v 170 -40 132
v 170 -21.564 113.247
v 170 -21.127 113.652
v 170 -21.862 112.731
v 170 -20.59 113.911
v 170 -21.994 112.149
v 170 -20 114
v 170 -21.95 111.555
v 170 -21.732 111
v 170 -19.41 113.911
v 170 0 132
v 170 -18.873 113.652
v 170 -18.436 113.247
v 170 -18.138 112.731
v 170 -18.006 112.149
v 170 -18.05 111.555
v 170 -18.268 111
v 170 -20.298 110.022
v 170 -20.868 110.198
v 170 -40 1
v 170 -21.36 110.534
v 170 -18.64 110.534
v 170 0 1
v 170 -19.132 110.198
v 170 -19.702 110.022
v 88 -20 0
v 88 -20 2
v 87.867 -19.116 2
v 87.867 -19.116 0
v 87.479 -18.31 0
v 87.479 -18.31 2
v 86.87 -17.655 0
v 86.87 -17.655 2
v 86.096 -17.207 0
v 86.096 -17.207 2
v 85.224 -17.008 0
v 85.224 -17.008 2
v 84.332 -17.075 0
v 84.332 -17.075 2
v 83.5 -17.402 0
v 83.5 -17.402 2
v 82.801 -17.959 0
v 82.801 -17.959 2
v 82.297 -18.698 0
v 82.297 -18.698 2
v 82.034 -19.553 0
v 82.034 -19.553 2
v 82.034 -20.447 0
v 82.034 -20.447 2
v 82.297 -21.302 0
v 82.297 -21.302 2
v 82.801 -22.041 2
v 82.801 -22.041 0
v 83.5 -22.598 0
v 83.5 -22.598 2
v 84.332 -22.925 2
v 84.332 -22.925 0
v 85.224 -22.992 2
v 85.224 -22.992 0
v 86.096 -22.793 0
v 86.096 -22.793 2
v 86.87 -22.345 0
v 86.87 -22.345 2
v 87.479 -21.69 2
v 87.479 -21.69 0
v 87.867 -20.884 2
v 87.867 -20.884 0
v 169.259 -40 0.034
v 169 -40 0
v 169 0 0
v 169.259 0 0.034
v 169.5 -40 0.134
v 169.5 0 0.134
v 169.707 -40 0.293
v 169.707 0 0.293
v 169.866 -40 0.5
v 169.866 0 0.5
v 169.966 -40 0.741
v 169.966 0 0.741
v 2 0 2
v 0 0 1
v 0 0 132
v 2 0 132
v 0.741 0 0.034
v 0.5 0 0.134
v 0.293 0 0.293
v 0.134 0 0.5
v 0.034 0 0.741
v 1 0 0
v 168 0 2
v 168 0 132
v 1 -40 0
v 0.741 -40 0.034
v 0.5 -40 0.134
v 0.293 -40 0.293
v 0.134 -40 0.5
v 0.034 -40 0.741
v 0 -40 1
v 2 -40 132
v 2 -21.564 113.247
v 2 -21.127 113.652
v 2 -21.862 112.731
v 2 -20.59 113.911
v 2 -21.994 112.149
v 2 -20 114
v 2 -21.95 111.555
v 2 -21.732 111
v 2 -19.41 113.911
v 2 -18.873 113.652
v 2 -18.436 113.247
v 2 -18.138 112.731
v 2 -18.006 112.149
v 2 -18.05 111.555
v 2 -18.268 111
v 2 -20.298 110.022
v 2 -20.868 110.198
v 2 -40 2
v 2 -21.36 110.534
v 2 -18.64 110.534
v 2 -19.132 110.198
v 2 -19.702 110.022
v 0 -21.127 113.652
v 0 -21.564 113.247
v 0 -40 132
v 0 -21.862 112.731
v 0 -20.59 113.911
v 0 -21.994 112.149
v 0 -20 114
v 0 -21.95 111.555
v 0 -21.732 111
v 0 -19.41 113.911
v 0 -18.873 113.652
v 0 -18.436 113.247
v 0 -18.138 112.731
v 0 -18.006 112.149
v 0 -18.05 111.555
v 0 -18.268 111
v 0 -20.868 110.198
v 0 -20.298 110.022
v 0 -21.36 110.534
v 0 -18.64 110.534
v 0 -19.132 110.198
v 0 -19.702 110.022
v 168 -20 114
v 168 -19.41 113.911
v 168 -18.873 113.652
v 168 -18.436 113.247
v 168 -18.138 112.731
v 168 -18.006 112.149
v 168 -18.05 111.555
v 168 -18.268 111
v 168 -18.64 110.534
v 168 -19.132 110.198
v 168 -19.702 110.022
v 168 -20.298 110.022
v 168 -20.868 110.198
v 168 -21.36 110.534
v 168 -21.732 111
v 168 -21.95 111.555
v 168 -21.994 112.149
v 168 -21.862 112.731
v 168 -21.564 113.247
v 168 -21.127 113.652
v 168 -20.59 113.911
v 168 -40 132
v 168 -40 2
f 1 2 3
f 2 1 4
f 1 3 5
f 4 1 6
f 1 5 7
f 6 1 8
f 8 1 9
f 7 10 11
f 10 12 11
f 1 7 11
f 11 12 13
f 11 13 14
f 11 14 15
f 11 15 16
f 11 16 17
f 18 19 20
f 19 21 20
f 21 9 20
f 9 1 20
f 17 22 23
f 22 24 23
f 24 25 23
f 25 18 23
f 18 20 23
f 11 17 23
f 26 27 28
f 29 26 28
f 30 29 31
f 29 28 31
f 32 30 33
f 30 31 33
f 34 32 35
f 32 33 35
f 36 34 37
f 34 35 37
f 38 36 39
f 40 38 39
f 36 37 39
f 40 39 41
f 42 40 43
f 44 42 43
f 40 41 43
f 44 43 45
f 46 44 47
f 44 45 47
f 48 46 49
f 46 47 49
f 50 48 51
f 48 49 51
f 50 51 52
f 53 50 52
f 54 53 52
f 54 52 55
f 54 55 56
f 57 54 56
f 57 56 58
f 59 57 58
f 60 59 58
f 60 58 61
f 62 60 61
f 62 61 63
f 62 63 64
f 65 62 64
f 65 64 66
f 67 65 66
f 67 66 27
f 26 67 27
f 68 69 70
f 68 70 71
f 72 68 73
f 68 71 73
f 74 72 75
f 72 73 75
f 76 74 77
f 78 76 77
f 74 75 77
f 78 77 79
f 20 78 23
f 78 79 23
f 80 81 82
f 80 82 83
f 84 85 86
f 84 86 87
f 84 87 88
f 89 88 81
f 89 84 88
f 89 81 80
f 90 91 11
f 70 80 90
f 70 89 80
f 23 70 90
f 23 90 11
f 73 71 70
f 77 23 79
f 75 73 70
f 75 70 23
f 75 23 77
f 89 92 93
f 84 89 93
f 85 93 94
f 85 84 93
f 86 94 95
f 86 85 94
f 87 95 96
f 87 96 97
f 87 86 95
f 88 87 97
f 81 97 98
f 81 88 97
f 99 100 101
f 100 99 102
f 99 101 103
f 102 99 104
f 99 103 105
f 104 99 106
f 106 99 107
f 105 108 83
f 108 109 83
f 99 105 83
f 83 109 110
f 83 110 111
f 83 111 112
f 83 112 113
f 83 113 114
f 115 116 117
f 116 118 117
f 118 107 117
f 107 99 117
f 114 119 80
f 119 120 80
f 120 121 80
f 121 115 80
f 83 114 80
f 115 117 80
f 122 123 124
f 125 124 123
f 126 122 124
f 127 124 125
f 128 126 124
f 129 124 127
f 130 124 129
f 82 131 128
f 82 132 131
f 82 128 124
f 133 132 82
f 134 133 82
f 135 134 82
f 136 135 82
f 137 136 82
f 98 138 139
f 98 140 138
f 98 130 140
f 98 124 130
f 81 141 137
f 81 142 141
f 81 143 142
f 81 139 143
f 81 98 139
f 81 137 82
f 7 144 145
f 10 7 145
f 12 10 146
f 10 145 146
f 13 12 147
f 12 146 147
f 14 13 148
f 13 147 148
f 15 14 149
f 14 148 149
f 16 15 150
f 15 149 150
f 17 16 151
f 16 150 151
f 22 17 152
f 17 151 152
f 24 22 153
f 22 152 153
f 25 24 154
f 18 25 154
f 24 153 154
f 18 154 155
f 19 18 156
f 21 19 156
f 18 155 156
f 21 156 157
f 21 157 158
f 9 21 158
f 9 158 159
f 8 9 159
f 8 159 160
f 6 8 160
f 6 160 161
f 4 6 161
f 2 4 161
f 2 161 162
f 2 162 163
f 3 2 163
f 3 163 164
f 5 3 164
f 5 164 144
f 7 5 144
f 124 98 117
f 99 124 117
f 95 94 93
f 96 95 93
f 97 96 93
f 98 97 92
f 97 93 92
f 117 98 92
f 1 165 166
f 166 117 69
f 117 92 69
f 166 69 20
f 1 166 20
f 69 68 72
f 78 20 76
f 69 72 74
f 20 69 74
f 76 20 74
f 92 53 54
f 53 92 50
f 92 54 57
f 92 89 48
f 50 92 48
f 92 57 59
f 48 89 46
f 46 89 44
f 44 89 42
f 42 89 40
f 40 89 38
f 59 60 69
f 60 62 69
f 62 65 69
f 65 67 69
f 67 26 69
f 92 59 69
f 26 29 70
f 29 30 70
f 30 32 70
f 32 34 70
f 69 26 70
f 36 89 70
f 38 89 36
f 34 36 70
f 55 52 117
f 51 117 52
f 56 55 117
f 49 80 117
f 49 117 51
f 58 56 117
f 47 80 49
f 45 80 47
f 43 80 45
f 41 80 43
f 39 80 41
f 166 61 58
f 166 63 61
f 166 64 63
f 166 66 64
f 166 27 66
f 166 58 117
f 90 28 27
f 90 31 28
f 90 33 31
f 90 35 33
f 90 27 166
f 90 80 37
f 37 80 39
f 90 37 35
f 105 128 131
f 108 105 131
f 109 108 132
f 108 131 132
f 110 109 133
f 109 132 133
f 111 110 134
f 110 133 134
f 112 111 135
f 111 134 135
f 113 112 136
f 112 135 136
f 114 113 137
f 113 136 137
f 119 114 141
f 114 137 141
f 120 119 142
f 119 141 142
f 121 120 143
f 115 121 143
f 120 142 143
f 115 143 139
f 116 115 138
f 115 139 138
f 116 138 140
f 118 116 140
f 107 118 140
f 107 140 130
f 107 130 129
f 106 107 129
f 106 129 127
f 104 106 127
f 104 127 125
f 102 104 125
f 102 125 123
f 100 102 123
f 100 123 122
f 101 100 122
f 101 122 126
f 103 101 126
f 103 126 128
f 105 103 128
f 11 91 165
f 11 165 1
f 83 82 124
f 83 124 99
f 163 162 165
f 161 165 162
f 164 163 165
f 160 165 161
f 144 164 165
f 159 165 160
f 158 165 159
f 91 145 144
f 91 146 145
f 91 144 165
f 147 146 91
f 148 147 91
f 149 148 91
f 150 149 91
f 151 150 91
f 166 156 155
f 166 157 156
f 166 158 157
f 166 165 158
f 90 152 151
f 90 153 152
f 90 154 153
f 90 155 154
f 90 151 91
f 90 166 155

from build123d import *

# Parameters (mm, degrees)
ESQUISSE1_W             = 170
ESQUISSE1_H             = 40
BOSS_EXTRU_1_DEPTH      = 2
ESQUISSE2_W             = 2
ESQUISSE2_H             = 40
BOSS_EXTRU_2_DEPTH      = 130
ESQUISSE3_W             = 2
ESQUISSE3_H             = 40
BOSS_EXTRU_3_DEPTH      = 130
ESQUISSE4_R             = 2
ENL_V_MAT_EXTRU_1_DEPTH = 171
CONG_1_R                = 1
CONG_2_R                = 1
ESQUISSE5_R             = 3
ENL_V_MAT_EXTRU_2_DEPTH = 130


with BuildPart() as part:
    # Esquisse1 → Boss.-Extru.1 (new body)
    with BuildSketch(Plane.XY):
        with Locations((85, -20)):
            Rectangle(ESQUISSE1_W, ESQUISSE1_H)
    extrude(amount=BOSS_EXTRU_1_DEPTH)

    # Esquisse2 → Boss.-Extru.2 (add)
    with BuildSketch(Plane.XY.offset(2)):
        with Locations((1, -20)):
            Rectangle(ESQUISSE2_W, ESQUISSE2_H)
    extrude(amount=BOSS_EXTRU_2_DEPTH)

    # Esquisse3 → Boss.-Extru.3 (add)
    with BuildSketch(Plane.XY.offset(2)):
        with Locations((169, -20)):
            Rectangle(ESQUISSE3_W, ESQUISSE3_H)
    extrude(amount=BOSS_EXTRU_3_DEPTH)

    # Esquisse4 → Enlèv. mat.-Extru.1 (cut, through all)
    with BuildSketch(Plane.ZY):
        with Locations((112, -20)):
            Circle(ESQUISSE4_R)
    extrude(amount=-ENL_V_MAT_EXTRU_1_DEPTH, mode=Mode.SUBTRACT)

    # Congé1
    cong_1_edges = [part.edges().sort_by_distance(p)[0] for p in [
        (0, -20, 0),
    ]]
    fillet(cong_1_edges, radius=CONG_1_R)

    # Congé2
    cong_2_edges = [part.edges().sort_by_distance(p)[0] for p in [
        (170, -20, 0),
    ]]
    fillet(cong_2_edges, radius=CONG_2_R)

    # Esquisse5 → Enlèv. mat.-Extru.2 (cut)
    with BuildSketch(Plane.XY.offset(2)):
        with Locations((85, -20)):
            Circle(ESQUISSE5_R)
    extrude(amount=-ENL_V_MAT_EXTRU_2_DEPTH, mode=Mode.SUBTRACT)


solid = part.part
